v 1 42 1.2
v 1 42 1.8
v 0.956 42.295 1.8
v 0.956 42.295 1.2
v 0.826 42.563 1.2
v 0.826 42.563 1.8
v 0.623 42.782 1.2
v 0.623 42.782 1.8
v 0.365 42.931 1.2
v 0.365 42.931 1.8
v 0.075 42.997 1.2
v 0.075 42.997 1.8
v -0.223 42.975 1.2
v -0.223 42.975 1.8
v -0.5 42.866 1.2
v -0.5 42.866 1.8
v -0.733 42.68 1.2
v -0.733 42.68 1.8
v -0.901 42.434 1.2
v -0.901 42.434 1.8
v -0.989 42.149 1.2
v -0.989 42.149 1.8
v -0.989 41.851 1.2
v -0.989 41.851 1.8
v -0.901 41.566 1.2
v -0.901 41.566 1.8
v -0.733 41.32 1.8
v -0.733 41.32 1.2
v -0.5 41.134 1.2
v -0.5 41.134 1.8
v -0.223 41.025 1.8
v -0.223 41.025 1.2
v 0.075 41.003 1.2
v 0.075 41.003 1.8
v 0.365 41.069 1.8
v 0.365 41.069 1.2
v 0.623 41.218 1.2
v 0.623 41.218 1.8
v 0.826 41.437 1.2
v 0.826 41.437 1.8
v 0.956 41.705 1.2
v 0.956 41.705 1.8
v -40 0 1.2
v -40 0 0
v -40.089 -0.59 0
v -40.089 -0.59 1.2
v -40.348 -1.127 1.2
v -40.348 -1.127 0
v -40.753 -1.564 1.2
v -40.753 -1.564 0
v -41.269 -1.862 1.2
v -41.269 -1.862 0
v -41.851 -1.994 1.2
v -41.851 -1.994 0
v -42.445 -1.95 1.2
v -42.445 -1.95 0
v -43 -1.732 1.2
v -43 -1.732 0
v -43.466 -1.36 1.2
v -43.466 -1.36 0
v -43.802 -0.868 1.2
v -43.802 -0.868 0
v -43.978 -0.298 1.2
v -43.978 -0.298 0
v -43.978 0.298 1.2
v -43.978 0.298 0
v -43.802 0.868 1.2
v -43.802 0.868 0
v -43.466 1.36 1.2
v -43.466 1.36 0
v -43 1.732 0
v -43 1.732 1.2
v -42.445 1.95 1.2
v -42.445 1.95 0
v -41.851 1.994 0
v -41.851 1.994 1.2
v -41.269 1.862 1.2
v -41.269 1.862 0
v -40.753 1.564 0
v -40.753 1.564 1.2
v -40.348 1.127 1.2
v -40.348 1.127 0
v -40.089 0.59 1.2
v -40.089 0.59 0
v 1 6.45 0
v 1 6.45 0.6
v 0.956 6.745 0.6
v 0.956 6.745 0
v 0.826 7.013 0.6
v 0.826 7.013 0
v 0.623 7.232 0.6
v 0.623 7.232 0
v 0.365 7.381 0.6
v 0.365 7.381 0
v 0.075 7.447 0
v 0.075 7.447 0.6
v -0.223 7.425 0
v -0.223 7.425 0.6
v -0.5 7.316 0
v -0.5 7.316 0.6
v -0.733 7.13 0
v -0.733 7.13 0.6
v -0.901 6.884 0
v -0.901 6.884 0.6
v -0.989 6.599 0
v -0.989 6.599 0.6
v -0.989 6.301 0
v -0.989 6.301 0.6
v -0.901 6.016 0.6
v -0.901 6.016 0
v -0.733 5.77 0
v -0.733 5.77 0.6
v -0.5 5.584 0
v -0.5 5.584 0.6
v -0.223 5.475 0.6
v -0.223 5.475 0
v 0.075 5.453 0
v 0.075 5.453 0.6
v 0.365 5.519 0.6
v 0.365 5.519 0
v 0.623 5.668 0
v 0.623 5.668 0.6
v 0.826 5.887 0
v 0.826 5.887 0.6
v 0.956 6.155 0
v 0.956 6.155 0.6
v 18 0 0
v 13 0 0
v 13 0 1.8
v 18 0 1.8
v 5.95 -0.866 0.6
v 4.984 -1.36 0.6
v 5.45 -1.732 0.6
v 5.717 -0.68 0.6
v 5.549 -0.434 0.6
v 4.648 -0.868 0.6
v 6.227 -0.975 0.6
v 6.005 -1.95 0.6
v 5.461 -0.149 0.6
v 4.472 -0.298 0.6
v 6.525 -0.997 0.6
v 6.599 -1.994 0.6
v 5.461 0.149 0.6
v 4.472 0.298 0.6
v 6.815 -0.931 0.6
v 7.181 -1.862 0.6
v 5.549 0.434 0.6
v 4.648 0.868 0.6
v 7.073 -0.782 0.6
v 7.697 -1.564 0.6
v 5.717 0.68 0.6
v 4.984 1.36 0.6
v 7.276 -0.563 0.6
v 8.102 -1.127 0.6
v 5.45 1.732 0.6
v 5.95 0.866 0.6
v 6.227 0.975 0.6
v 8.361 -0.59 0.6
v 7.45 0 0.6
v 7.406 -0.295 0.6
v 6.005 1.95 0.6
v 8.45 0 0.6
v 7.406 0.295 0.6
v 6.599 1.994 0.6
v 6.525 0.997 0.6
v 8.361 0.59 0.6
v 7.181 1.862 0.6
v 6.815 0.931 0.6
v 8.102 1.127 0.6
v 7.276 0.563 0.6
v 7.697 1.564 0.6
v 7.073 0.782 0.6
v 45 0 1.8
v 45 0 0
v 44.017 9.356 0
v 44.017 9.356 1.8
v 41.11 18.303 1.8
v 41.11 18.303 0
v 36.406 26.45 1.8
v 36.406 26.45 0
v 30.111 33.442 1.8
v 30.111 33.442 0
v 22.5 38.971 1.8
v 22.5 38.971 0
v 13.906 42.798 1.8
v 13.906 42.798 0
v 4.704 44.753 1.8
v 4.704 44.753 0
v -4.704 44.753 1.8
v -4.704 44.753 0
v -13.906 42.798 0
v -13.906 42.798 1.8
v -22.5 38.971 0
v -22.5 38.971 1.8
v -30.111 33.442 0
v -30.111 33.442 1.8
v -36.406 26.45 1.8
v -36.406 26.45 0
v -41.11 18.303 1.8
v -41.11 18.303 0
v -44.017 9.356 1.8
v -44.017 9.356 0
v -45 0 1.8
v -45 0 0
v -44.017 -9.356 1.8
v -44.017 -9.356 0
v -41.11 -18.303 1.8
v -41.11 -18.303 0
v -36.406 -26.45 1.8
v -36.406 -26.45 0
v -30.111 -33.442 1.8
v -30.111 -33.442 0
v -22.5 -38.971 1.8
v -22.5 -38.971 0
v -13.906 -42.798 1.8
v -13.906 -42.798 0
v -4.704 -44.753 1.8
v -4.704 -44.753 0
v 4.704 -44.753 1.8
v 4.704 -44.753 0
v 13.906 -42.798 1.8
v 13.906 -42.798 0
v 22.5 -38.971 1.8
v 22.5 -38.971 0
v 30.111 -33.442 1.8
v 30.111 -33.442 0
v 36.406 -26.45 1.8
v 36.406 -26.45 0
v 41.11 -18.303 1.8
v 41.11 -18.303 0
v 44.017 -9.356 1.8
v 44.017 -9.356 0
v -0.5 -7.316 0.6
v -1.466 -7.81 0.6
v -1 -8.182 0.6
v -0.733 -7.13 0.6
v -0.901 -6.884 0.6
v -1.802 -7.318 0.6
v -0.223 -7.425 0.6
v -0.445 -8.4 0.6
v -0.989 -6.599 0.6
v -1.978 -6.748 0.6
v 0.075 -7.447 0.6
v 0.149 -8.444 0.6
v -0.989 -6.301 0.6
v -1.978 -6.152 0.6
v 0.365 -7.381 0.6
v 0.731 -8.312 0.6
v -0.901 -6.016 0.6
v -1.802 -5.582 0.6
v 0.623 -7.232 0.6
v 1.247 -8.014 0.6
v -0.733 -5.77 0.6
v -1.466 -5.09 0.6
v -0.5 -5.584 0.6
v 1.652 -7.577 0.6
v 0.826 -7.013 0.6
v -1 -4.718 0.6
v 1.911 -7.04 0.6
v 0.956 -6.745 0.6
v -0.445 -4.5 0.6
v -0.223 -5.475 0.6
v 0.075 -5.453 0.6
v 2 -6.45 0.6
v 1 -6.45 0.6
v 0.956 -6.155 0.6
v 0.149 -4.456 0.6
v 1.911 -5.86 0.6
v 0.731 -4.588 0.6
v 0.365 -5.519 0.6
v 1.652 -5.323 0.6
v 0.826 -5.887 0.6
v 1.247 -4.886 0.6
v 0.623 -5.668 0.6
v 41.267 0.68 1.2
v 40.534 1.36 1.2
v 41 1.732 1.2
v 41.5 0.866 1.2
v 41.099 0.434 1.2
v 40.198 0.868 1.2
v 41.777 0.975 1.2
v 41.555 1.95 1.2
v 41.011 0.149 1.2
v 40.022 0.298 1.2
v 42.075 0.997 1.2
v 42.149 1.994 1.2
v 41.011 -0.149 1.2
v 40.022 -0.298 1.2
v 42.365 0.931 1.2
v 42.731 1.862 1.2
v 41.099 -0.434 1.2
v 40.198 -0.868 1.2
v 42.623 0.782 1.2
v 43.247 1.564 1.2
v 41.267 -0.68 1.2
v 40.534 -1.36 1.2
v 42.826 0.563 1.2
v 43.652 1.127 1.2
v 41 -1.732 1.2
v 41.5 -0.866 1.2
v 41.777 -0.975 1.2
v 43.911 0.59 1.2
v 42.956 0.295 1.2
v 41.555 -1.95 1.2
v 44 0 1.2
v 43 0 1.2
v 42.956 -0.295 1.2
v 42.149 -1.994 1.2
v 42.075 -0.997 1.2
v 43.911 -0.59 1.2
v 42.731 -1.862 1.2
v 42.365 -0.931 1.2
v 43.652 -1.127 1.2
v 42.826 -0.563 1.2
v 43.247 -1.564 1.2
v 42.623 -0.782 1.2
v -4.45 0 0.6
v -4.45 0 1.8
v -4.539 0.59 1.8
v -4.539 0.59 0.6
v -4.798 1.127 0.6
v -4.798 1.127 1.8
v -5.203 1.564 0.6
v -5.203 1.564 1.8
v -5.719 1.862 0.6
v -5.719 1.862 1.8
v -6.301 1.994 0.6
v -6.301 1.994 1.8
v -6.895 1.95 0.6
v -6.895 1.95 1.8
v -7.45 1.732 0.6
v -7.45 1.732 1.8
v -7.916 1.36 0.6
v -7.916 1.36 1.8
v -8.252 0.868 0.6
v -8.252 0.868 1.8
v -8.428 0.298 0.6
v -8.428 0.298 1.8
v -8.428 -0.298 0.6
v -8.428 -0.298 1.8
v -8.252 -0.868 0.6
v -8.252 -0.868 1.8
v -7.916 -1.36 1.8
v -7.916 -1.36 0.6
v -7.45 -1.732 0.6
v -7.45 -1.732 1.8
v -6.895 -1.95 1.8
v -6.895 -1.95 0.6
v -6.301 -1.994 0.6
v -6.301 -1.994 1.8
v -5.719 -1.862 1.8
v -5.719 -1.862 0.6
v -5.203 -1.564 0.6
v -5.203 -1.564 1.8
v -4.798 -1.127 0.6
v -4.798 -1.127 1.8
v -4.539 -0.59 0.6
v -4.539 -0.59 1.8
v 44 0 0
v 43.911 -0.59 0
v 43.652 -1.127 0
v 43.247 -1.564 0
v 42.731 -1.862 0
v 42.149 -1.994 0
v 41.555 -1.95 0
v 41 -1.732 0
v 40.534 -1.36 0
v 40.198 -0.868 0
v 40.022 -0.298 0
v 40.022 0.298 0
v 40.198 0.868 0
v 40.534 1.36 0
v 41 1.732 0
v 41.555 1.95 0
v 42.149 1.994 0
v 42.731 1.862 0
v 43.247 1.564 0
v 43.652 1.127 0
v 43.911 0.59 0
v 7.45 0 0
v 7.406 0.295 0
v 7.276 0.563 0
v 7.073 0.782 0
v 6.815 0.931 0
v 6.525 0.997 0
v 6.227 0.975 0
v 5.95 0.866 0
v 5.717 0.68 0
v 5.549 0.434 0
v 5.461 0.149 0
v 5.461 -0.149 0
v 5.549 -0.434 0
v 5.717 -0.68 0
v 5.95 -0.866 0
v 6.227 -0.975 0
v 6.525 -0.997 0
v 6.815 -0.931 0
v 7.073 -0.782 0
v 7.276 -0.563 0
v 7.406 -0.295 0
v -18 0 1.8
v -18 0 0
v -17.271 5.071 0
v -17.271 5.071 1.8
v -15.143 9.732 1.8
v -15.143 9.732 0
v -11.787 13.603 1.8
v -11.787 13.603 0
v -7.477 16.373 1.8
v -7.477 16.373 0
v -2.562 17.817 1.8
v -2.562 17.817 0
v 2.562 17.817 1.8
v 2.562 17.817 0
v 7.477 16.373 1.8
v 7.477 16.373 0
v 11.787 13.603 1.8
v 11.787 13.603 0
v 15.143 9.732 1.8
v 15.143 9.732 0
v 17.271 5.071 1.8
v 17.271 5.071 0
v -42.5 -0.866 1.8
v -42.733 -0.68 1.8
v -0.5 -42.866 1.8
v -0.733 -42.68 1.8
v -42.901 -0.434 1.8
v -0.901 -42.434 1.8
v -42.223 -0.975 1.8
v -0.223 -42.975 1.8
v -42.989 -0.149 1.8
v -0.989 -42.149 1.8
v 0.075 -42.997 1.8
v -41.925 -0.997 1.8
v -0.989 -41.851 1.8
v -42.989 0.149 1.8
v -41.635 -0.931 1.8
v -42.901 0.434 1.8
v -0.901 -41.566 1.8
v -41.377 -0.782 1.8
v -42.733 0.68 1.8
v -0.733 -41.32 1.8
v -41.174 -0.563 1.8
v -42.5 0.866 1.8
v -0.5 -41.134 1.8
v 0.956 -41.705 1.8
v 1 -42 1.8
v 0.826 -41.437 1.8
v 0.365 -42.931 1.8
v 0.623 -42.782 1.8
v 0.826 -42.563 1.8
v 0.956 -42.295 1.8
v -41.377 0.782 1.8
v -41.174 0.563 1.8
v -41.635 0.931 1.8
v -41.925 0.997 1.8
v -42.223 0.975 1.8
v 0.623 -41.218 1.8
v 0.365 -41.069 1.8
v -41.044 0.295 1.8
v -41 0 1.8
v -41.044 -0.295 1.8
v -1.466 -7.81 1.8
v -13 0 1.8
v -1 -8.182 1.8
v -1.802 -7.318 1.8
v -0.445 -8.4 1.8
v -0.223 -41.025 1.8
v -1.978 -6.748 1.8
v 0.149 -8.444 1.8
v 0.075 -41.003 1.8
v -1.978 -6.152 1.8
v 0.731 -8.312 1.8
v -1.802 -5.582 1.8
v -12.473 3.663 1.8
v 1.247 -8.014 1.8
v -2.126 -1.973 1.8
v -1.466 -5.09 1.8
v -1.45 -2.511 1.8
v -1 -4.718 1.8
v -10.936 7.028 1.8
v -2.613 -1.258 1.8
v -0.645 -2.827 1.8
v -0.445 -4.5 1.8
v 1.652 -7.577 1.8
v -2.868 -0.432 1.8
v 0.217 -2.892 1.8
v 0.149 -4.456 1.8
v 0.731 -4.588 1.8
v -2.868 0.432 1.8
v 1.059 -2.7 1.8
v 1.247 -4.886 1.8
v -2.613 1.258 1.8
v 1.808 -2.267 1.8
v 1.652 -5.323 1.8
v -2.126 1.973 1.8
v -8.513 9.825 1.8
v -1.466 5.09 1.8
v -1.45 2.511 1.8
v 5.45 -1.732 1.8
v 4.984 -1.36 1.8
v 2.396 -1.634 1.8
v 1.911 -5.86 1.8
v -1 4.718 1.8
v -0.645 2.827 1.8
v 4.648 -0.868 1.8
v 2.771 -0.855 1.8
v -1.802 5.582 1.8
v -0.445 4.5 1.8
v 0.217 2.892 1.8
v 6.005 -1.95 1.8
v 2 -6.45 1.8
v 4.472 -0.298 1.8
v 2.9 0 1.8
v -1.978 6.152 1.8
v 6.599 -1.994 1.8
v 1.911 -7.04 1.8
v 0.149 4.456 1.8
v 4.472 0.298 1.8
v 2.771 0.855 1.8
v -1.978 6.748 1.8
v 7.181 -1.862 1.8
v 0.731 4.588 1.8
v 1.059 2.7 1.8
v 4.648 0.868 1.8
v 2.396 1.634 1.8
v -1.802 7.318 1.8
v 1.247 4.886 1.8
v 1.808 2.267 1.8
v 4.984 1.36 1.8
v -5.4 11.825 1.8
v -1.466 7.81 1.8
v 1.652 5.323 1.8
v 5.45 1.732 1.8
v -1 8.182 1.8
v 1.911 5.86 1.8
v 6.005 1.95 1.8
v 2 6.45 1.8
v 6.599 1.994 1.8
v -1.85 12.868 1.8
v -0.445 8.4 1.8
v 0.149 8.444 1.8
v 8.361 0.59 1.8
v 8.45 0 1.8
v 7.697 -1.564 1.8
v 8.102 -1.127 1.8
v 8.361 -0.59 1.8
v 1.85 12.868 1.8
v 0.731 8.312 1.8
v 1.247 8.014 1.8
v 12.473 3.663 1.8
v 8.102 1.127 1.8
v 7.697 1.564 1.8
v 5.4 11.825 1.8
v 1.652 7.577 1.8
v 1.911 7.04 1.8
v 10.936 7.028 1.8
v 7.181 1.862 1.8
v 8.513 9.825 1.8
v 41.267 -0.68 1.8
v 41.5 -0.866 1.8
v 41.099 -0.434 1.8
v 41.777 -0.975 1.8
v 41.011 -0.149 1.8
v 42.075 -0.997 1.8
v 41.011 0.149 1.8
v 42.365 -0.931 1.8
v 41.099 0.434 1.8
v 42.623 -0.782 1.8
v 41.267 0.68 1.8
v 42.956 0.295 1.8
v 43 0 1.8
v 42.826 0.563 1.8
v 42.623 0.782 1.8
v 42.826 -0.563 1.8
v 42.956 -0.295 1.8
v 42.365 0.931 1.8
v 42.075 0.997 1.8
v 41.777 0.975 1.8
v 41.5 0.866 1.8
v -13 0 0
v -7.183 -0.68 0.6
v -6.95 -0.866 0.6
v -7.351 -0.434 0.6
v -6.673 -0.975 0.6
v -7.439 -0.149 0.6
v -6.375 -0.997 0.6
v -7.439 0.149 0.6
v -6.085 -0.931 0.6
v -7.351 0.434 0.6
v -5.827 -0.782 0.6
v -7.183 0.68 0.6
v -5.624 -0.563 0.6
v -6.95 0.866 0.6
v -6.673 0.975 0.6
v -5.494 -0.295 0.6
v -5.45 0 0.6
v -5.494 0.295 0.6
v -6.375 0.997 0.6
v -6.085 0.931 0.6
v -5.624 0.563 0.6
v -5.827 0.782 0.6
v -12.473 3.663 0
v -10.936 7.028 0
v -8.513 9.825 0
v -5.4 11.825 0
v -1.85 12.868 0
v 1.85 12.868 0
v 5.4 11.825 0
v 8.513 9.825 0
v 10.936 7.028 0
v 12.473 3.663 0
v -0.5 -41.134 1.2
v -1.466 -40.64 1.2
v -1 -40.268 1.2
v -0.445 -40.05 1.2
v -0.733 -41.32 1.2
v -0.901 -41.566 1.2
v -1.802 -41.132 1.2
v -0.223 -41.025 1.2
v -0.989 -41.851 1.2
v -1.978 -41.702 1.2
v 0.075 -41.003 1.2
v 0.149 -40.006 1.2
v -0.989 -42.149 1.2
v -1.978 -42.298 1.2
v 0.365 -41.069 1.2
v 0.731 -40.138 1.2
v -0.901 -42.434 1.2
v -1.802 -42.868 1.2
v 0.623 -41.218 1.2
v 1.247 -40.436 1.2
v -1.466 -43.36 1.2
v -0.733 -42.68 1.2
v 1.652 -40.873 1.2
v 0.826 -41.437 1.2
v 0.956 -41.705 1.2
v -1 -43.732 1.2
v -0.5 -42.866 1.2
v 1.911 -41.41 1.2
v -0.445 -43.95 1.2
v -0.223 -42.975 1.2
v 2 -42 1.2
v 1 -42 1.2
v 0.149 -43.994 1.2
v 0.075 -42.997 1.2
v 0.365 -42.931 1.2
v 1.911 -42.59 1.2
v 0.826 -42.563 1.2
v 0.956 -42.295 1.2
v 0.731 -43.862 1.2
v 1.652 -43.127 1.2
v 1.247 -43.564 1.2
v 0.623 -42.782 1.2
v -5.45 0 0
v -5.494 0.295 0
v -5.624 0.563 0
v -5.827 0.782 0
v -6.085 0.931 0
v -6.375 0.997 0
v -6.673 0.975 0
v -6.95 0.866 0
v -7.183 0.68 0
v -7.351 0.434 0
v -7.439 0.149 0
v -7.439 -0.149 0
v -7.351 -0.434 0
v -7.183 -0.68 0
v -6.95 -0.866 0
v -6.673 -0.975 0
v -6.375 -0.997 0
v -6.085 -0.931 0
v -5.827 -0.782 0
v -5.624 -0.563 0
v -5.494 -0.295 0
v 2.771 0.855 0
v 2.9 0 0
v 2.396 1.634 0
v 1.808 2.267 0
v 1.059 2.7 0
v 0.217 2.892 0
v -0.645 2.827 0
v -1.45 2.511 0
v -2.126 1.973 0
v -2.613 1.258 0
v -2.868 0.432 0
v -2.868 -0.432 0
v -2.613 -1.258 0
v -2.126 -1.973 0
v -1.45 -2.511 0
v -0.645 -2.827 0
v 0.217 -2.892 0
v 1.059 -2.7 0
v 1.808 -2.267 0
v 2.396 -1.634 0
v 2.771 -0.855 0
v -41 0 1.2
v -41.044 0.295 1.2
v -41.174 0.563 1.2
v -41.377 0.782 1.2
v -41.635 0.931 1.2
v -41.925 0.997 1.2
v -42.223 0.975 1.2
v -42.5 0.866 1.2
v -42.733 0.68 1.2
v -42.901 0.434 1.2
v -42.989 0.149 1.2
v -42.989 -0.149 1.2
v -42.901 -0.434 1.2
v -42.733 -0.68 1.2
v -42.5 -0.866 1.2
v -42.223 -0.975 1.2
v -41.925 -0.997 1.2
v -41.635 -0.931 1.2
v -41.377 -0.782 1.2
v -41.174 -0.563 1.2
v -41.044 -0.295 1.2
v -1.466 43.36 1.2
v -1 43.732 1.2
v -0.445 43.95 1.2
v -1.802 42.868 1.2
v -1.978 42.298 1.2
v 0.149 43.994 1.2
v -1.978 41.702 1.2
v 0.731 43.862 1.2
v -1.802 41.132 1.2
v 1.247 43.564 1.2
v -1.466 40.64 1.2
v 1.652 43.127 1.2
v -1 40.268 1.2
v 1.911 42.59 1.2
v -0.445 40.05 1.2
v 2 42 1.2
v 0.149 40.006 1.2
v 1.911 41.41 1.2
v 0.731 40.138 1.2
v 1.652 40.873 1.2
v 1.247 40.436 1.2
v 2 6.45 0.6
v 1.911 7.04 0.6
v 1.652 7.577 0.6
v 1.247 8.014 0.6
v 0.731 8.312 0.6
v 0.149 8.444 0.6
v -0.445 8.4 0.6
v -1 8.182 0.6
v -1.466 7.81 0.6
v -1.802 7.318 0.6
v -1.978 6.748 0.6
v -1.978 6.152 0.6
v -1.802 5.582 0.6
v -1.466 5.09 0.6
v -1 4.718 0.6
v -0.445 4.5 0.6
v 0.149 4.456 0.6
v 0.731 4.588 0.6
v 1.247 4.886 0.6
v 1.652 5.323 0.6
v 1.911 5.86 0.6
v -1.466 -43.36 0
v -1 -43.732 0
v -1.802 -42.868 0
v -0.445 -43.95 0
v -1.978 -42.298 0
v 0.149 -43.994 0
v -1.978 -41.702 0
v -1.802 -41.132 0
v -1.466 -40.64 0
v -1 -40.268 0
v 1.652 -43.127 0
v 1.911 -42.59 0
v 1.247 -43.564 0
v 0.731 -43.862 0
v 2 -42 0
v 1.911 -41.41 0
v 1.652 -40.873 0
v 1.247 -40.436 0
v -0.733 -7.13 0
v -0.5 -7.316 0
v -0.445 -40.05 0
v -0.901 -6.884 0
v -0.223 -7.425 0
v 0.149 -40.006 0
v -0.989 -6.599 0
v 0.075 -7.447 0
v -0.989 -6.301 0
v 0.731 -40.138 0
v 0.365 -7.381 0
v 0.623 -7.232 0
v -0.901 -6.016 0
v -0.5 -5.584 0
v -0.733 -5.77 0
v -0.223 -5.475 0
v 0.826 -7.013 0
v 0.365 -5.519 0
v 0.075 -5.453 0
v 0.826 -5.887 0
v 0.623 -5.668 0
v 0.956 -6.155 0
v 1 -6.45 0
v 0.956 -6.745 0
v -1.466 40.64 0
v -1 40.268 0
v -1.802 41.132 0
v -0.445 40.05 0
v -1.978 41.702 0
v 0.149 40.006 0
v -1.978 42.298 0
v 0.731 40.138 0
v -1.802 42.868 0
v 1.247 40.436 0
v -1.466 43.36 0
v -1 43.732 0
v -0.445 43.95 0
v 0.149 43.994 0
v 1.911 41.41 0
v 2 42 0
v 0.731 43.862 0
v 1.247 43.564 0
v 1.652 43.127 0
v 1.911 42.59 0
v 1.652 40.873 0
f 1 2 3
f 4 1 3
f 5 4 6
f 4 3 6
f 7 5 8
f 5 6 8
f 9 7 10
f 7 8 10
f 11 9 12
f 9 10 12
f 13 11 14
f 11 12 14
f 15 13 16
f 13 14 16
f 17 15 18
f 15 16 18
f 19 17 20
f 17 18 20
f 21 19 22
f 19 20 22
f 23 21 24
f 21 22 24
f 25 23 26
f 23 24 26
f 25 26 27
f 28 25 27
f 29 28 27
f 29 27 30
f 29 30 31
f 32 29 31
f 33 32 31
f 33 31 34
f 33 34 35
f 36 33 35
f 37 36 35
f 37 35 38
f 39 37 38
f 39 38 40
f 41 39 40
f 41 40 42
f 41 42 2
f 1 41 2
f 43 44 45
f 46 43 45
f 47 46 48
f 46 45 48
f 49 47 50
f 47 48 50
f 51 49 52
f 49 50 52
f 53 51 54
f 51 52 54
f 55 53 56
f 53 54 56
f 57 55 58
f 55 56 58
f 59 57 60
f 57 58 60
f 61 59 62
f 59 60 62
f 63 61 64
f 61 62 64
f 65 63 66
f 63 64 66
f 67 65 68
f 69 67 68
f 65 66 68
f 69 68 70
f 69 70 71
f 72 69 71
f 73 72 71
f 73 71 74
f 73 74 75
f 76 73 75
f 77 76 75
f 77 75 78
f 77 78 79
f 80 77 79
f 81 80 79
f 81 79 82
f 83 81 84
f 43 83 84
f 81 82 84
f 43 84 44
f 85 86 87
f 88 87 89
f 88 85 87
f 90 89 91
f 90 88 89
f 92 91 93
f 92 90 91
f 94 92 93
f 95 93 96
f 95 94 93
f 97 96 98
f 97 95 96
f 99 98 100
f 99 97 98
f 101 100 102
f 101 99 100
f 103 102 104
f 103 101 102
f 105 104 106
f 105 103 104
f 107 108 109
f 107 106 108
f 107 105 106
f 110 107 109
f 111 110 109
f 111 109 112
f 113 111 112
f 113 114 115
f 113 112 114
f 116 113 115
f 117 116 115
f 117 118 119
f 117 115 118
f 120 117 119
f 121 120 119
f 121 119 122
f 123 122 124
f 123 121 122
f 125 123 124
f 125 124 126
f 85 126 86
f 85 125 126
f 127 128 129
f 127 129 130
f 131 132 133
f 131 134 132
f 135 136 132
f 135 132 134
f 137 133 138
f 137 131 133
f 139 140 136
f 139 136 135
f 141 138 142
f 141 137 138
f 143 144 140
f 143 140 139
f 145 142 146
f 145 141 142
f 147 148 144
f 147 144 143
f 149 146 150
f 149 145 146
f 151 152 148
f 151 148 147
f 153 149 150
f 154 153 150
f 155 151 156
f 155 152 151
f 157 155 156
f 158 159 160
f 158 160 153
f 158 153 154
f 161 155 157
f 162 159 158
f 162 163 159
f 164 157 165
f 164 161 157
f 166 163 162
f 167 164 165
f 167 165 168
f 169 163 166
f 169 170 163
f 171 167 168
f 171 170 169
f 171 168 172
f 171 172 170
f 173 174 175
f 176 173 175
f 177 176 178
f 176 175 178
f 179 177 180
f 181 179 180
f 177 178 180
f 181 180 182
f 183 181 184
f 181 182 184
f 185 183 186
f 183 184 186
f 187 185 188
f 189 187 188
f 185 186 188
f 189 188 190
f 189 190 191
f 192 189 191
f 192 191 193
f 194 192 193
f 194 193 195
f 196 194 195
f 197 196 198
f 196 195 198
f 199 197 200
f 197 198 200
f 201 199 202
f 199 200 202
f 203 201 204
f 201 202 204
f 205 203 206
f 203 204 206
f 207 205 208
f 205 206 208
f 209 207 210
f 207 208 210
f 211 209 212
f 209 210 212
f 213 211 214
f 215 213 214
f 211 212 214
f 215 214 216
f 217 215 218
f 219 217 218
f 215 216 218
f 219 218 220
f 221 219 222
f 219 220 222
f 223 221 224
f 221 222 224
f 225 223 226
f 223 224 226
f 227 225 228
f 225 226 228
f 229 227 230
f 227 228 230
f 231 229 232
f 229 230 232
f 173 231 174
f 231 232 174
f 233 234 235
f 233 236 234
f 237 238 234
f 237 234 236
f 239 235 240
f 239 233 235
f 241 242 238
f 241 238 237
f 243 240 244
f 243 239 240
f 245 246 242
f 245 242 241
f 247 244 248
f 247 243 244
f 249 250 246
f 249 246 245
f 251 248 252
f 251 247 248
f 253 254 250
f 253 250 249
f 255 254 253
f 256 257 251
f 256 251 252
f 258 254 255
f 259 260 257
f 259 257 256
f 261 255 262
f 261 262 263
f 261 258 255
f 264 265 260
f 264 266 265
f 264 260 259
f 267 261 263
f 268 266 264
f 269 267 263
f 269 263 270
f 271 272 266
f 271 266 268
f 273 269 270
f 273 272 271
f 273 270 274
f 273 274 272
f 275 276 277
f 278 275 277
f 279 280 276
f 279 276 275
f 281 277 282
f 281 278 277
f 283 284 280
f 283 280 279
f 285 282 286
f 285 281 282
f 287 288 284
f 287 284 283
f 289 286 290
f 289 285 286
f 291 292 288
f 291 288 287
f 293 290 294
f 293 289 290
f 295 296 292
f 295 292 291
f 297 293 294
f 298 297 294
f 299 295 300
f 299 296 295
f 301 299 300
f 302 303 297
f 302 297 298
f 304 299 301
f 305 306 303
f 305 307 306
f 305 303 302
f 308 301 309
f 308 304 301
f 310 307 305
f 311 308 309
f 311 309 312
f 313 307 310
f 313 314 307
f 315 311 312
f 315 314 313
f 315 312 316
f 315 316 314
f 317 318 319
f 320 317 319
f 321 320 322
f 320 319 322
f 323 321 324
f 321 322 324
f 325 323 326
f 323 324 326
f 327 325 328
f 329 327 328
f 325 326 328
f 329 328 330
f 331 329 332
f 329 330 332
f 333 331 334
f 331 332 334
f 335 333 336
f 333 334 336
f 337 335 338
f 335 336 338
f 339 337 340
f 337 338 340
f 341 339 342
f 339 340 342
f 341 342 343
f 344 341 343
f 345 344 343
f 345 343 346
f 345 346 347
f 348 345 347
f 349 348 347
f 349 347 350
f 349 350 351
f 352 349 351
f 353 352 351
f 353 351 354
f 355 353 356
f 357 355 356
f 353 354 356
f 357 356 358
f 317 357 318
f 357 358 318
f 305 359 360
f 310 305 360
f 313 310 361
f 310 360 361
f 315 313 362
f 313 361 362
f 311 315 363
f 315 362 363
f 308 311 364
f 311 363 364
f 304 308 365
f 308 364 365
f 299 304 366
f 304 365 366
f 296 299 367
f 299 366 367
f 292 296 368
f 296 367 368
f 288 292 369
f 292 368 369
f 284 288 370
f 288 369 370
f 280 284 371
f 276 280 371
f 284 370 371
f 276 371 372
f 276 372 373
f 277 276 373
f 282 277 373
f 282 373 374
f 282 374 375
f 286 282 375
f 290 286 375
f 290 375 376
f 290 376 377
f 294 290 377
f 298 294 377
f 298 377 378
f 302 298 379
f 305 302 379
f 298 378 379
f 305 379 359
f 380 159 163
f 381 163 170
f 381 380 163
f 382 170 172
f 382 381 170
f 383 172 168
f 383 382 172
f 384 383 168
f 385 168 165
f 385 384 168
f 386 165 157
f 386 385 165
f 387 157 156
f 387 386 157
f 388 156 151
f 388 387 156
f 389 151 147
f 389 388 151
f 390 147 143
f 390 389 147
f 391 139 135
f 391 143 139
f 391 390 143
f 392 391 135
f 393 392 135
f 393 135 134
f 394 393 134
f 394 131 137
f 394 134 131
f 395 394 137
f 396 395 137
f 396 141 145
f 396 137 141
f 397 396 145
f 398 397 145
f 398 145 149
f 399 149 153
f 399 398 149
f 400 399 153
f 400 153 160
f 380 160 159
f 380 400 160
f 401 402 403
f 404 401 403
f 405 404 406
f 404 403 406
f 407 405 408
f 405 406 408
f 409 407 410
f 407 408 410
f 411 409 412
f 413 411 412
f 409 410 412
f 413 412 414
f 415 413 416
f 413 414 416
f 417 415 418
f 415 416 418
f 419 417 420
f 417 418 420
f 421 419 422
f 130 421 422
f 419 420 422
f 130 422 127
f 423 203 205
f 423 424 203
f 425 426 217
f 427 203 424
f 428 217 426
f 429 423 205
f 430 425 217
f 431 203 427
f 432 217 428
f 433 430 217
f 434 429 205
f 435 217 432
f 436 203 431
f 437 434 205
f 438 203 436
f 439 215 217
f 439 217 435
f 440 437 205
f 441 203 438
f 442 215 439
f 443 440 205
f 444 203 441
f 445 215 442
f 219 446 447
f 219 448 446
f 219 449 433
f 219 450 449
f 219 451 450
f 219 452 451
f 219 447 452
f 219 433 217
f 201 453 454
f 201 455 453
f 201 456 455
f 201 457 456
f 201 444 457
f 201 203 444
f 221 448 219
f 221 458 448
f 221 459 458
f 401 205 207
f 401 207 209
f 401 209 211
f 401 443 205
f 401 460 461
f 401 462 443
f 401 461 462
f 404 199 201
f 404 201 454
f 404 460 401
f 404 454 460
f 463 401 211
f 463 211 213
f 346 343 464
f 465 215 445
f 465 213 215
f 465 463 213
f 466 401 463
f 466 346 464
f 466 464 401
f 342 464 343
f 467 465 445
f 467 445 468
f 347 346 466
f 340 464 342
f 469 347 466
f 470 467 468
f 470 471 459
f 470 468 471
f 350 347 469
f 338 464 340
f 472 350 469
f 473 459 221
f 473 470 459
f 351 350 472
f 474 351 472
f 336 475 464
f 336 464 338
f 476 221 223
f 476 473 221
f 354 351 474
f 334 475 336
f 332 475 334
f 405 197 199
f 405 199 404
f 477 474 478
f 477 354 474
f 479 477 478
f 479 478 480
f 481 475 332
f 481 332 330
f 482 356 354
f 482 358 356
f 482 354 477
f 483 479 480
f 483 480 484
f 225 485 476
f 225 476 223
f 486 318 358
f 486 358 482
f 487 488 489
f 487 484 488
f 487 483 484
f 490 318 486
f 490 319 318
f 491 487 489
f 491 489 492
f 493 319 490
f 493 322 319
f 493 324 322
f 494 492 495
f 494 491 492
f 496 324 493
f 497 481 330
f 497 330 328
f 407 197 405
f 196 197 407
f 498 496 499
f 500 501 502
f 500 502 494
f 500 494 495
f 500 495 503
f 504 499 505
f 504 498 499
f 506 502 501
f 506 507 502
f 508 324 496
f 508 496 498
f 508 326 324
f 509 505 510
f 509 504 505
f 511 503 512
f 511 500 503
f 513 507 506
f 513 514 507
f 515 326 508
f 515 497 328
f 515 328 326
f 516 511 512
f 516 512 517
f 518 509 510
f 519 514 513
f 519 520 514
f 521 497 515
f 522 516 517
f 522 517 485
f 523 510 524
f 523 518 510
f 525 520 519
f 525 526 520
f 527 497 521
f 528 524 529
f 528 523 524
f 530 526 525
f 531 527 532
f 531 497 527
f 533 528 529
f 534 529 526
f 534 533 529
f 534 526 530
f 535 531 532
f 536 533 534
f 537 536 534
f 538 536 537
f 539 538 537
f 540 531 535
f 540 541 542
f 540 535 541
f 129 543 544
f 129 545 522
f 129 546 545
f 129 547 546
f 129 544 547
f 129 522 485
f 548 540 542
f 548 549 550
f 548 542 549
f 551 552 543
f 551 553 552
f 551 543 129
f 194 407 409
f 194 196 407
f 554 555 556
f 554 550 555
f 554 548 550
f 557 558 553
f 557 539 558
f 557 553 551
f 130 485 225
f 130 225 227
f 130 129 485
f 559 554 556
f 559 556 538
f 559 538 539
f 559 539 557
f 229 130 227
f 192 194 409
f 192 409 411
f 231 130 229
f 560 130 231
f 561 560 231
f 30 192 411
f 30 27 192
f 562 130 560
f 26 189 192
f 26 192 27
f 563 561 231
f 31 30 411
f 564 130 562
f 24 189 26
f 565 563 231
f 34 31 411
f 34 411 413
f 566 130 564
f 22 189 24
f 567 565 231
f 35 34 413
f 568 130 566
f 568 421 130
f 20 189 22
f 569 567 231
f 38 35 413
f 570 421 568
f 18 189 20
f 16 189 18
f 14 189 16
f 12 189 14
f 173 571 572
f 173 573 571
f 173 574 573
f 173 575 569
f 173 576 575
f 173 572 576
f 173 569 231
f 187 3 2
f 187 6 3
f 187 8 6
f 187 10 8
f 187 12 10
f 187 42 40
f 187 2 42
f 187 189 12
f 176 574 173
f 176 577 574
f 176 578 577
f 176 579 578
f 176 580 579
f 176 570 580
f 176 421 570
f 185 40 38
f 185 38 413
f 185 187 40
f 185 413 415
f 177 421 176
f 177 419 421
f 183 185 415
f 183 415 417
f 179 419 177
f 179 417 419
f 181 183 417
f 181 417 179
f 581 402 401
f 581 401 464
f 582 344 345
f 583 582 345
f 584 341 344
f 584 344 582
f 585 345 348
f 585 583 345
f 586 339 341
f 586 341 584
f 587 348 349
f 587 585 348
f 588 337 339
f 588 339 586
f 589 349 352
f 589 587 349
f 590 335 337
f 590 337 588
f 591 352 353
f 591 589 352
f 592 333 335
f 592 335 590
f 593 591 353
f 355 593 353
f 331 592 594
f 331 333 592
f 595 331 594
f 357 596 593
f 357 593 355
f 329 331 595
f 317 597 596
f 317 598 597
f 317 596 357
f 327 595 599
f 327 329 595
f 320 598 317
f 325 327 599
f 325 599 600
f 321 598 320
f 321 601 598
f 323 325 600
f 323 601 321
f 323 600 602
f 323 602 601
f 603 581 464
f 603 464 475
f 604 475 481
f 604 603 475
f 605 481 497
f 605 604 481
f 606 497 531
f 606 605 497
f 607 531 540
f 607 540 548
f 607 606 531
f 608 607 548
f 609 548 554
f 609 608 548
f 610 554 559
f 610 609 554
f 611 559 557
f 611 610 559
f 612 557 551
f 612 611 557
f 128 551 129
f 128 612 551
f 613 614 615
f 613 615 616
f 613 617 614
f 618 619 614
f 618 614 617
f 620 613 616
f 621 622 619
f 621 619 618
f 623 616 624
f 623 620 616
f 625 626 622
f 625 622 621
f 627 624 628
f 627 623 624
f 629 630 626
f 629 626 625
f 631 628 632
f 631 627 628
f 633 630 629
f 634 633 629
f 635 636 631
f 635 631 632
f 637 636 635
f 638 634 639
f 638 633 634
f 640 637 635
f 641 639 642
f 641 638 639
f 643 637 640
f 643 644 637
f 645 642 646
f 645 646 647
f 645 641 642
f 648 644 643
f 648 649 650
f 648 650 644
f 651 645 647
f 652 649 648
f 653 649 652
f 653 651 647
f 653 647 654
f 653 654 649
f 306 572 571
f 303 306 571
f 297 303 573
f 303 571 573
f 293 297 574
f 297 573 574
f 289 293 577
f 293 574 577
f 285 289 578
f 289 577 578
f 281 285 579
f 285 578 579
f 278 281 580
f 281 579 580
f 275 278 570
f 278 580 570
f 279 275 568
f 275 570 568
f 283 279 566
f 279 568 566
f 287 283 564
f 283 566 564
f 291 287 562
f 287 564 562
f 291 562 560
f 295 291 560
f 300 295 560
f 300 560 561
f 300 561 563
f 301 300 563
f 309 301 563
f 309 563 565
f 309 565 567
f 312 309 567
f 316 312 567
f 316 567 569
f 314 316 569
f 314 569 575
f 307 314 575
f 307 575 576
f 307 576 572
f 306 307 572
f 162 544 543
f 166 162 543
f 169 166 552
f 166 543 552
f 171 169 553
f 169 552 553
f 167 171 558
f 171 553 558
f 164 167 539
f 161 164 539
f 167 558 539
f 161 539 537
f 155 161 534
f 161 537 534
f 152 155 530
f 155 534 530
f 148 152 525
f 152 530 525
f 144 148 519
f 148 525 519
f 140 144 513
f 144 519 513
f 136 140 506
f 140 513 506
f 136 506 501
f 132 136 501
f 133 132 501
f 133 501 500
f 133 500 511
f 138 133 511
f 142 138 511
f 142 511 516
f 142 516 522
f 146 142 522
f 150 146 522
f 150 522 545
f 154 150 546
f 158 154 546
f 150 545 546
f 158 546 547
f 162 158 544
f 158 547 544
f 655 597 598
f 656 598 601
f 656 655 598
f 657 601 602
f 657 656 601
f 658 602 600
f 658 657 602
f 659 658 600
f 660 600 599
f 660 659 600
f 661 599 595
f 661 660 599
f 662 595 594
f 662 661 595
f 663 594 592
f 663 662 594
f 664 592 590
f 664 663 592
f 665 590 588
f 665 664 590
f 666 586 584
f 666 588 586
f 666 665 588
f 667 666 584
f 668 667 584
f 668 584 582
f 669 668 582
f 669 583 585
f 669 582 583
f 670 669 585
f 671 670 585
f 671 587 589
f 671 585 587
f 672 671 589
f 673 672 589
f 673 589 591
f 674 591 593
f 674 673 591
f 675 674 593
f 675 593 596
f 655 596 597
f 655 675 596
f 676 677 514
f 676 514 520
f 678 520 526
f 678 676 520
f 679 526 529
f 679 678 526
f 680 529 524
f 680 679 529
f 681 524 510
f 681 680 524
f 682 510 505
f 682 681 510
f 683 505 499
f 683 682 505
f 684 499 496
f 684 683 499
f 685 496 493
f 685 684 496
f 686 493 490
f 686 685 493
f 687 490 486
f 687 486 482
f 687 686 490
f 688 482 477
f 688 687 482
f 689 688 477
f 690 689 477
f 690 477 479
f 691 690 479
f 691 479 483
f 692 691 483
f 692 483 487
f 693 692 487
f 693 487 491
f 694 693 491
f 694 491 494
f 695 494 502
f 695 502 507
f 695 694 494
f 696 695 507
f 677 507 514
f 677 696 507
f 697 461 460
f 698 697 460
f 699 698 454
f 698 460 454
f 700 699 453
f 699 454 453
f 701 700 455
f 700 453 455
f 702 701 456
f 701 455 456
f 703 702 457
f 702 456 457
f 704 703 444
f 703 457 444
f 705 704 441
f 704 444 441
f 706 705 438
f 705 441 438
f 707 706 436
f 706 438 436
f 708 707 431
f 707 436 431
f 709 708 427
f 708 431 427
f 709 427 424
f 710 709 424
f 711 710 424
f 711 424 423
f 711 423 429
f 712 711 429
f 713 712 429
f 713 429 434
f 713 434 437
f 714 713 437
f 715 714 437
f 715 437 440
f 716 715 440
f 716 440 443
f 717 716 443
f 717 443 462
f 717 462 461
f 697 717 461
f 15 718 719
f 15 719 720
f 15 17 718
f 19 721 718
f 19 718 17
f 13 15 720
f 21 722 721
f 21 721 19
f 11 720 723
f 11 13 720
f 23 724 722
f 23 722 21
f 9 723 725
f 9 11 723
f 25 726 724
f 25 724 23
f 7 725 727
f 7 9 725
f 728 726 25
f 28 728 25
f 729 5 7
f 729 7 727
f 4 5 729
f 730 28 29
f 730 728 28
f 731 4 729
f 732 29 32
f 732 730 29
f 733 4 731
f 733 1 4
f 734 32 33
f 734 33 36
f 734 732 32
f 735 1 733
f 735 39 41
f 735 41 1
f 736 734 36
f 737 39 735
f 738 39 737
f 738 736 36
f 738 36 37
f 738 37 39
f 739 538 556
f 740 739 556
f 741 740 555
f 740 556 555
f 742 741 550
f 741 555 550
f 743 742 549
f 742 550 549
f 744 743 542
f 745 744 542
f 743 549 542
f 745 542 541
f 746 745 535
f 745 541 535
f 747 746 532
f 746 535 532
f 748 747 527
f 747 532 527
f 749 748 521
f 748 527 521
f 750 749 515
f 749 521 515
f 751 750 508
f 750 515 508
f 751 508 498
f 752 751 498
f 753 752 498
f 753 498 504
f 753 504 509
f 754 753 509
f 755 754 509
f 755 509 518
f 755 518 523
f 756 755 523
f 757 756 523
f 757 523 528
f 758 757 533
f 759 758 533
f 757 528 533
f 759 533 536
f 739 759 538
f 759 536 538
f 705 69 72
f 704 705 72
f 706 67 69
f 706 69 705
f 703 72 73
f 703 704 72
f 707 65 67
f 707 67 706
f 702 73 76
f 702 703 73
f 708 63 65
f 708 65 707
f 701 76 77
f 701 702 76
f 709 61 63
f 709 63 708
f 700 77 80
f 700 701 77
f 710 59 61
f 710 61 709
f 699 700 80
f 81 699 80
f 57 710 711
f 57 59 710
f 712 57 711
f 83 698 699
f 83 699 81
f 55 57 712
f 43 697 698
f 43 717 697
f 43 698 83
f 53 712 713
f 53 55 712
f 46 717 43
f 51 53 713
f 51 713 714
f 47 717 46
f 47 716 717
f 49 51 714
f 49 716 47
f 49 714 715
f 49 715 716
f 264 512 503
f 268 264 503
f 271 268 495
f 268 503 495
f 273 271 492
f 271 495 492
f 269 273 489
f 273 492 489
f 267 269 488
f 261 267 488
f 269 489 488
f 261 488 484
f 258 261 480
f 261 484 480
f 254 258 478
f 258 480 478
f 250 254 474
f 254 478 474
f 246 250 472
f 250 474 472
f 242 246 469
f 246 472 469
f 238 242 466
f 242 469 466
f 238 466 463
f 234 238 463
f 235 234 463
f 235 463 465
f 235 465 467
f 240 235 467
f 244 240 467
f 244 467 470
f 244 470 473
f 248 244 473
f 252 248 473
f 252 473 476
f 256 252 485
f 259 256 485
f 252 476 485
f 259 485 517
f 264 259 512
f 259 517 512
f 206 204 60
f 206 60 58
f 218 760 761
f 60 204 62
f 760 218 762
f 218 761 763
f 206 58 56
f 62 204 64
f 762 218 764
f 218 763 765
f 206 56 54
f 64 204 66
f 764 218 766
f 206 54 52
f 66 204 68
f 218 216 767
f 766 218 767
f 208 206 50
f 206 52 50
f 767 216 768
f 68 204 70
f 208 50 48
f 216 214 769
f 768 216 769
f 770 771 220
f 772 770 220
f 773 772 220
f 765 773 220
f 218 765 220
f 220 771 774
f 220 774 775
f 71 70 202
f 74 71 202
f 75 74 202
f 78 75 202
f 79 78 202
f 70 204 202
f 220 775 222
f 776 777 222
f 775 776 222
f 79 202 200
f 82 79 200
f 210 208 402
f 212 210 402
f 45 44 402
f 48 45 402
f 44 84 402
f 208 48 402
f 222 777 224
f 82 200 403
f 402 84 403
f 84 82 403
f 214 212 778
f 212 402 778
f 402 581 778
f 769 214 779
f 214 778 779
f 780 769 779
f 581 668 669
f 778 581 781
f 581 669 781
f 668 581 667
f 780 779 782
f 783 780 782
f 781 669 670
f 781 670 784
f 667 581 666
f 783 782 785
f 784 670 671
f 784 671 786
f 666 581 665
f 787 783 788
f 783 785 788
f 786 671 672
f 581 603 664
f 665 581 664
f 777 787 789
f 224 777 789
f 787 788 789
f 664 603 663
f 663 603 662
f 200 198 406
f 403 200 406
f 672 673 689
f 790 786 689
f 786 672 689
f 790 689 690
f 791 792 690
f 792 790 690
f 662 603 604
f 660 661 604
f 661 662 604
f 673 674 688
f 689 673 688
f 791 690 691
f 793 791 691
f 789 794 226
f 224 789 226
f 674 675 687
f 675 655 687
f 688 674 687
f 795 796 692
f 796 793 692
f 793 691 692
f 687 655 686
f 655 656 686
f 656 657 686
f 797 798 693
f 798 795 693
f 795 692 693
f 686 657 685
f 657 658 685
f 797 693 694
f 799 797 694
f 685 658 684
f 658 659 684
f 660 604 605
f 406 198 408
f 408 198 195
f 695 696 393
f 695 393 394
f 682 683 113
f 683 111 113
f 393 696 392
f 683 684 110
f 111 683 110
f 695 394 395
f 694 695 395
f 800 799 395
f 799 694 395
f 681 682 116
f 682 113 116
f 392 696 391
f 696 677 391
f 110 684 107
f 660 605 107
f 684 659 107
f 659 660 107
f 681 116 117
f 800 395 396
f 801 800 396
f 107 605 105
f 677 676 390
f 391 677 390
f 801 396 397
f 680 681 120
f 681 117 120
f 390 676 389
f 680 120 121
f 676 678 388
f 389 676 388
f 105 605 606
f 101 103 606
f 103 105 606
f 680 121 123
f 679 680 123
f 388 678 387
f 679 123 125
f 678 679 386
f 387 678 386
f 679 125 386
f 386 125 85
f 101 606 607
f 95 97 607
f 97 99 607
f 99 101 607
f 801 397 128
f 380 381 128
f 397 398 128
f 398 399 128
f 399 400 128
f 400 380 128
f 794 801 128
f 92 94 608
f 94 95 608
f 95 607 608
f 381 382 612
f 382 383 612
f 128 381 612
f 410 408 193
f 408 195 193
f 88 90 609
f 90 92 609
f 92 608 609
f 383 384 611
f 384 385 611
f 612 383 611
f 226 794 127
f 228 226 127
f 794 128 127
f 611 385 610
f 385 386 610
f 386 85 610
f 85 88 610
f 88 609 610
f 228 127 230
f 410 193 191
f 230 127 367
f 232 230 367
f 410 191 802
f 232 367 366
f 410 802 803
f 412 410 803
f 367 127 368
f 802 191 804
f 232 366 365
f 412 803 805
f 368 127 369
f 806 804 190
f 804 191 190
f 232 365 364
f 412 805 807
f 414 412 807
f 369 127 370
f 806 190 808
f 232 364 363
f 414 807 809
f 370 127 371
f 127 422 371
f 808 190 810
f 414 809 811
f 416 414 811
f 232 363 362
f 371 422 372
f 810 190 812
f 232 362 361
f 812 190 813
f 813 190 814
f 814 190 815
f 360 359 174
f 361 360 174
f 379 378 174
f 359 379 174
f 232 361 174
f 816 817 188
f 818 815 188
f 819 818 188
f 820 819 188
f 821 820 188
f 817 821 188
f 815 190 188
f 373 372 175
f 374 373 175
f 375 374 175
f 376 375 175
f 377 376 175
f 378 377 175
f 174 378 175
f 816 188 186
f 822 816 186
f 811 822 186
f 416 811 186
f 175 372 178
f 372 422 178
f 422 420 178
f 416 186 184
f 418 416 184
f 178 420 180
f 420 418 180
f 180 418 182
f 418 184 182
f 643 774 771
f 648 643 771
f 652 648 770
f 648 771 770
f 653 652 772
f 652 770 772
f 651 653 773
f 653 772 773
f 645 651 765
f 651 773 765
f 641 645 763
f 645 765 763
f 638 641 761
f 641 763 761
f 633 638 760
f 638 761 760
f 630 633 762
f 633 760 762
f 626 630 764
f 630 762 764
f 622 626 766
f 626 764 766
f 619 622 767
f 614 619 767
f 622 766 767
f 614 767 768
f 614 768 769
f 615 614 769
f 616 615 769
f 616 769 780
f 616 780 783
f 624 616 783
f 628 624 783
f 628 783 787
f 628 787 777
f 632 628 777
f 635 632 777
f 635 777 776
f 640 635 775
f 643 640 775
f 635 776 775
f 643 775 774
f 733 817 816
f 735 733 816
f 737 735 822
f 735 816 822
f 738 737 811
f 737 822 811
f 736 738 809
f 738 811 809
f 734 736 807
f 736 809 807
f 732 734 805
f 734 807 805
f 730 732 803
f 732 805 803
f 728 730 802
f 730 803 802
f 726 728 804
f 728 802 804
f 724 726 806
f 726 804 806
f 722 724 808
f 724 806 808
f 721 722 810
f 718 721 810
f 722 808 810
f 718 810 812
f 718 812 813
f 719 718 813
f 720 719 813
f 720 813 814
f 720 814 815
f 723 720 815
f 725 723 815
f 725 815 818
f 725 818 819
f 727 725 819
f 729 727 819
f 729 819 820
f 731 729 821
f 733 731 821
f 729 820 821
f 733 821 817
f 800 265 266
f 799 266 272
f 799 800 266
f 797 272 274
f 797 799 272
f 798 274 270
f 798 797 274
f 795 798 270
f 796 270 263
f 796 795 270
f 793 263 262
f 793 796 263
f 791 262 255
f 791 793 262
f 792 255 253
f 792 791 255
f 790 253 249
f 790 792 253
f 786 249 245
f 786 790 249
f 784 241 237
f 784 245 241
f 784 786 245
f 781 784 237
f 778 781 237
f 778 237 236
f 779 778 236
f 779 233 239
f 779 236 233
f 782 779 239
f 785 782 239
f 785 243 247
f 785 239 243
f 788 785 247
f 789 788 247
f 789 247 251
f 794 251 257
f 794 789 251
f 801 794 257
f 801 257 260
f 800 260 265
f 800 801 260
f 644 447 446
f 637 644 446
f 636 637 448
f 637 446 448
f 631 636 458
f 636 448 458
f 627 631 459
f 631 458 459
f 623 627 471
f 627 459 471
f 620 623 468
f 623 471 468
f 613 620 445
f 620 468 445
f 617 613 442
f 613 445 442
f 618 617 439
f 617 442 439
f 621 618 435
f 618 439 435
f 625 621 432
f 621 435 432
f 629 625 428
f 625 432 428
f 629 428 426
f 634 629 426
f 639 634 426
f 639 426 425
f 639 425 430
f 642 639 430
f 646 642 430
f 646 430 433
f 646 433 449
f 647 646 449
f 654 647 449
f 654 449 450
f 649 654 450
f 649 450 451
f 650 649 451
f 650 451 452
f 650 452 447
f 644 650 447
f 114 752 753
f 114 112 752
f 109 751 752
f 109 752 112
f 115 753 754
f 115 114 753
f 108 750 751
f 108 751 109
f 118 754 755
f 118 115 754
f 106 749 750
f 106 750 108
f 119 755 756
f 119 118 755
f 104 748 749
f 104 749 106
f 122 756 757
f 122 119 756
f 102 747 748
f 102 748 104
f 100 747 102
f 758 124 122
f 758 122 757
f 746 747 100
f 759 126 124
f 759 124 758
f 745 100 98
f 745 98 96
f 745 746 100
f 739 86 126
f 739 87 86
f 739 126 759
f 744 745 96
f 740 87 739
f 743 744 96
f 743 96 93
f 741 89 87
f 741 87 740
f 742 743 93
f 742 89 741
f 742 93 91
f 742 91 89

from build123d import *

# Parameters (mm, degrees)
SKETCH_R        = 45
SKETCH_R_2      = 1
SKETCH_R_3      = 2.9
PAD_DEPTH       = 1.8
SKETCH001_R     = 2
POCKET_DEPTH    = 1.2
SKETCH002_R     = 1
POCKET001_DEPTH = 1.801
SKETCH003_R     = 2
POCKET002_DEPTH = 1.2
POCKET003_DEPTH = 1.801


with BuildPart() as part:
    # Sketch → Pad (new body)
    with BuildSketch(Plane.XY):
        Circle(SKETCH_R)
        with Locations((0, 6.45)):
            Circle(SKETCH_R_2, mode=Mode.SUBTRACT)
        with Locations((-6.45, 0)):
            Circle(SKETCH_R_2, mode=Mode.SUBTRACT)
        with Locations((6.45, 0)):
            Circle(SKETCH_R_2, mode=Mode.SUBTRACT)
        with Locations((0, -6.45)):
            Circle(SKETCH_R_2, mode=Mode.SUBTRACT)
        Circle(SKETCH_R_3, mode=Mode.SUBTRACT)
    extrude(amount=PAD_DEPTH)

    # Sketch001 → Pocket (cut)
    with BuildSketch(Plane.XY.offset(1.8)):
        with Locations((-6.45, 0)):
            Circle(SKETCH001_R)
        with Locations((0, 6.45)):
            Circle(SKETCH001_R)
        with Locations((6.45, 0)):
            Circle(SKETCH001_R)
        with Locations((0, -6.45)):
            Circle(SKETCH001_R)
    extrude(amount=-POCKET_DEPTH, mode=Mode.SUBTRACT)

    # Sketch002 → Pocket001 (cut, through all)
    with BuildSketch(Plane.XY.offset(1.8)):
        with Locations((-42, 0)):
            Circle(SKETCH002_R)
        with Locations((42, 0)):
            Circle(SKETCH002_R)
        with Locations((0, 42)):
            Circle(SKETCH002_R)
        with Locations((0, -42)):
            Circle(SKETCH002_R)
    extrude(amount=-POCKET001_DEPTH, mode=Mode.SUBTRACT)

    # Sketch003 → Pocket002 (cut)
    with BuildSketch(Plane(origin=(0, 0, 0), x_dir=(1, 0, 0), z_dir=(0, 0, -1))):
        with Locations((-42, 0)):
            Circle(SKETCH003_R)
        with Locations((0, 42)):
            Circle(SKETCH003_R)
        with Locations((42, 0)):
            Circle(SKETCH003_R)
        with Locations((0, -42)):
            Circle(SKETCH003_R)
    extrude(amount=-POCKET002_DEPTH, mode=Mode.SUBTRACT)

    # Sketch004 → Pocket003 (cut, through all)
    with BuildSketch(Plane(origin=(0, 0, 0), x_dir=(1, 0, 0), z_dir=(0, 0, -1))):
        with BuildLine():
            ThreePointArc((-13, 0), (0, -13), (13, 0))
            Line((13, 0), (18, 0))
            ThreePointArc((-18, 0), (0, -18), (18, 0))
            Line((-18, 0), (-13, 0))
        make_face()
    extrude(amount=-POCKET003_DEPTH, mode=Mode.SUBTRACT)


solid = part.part
